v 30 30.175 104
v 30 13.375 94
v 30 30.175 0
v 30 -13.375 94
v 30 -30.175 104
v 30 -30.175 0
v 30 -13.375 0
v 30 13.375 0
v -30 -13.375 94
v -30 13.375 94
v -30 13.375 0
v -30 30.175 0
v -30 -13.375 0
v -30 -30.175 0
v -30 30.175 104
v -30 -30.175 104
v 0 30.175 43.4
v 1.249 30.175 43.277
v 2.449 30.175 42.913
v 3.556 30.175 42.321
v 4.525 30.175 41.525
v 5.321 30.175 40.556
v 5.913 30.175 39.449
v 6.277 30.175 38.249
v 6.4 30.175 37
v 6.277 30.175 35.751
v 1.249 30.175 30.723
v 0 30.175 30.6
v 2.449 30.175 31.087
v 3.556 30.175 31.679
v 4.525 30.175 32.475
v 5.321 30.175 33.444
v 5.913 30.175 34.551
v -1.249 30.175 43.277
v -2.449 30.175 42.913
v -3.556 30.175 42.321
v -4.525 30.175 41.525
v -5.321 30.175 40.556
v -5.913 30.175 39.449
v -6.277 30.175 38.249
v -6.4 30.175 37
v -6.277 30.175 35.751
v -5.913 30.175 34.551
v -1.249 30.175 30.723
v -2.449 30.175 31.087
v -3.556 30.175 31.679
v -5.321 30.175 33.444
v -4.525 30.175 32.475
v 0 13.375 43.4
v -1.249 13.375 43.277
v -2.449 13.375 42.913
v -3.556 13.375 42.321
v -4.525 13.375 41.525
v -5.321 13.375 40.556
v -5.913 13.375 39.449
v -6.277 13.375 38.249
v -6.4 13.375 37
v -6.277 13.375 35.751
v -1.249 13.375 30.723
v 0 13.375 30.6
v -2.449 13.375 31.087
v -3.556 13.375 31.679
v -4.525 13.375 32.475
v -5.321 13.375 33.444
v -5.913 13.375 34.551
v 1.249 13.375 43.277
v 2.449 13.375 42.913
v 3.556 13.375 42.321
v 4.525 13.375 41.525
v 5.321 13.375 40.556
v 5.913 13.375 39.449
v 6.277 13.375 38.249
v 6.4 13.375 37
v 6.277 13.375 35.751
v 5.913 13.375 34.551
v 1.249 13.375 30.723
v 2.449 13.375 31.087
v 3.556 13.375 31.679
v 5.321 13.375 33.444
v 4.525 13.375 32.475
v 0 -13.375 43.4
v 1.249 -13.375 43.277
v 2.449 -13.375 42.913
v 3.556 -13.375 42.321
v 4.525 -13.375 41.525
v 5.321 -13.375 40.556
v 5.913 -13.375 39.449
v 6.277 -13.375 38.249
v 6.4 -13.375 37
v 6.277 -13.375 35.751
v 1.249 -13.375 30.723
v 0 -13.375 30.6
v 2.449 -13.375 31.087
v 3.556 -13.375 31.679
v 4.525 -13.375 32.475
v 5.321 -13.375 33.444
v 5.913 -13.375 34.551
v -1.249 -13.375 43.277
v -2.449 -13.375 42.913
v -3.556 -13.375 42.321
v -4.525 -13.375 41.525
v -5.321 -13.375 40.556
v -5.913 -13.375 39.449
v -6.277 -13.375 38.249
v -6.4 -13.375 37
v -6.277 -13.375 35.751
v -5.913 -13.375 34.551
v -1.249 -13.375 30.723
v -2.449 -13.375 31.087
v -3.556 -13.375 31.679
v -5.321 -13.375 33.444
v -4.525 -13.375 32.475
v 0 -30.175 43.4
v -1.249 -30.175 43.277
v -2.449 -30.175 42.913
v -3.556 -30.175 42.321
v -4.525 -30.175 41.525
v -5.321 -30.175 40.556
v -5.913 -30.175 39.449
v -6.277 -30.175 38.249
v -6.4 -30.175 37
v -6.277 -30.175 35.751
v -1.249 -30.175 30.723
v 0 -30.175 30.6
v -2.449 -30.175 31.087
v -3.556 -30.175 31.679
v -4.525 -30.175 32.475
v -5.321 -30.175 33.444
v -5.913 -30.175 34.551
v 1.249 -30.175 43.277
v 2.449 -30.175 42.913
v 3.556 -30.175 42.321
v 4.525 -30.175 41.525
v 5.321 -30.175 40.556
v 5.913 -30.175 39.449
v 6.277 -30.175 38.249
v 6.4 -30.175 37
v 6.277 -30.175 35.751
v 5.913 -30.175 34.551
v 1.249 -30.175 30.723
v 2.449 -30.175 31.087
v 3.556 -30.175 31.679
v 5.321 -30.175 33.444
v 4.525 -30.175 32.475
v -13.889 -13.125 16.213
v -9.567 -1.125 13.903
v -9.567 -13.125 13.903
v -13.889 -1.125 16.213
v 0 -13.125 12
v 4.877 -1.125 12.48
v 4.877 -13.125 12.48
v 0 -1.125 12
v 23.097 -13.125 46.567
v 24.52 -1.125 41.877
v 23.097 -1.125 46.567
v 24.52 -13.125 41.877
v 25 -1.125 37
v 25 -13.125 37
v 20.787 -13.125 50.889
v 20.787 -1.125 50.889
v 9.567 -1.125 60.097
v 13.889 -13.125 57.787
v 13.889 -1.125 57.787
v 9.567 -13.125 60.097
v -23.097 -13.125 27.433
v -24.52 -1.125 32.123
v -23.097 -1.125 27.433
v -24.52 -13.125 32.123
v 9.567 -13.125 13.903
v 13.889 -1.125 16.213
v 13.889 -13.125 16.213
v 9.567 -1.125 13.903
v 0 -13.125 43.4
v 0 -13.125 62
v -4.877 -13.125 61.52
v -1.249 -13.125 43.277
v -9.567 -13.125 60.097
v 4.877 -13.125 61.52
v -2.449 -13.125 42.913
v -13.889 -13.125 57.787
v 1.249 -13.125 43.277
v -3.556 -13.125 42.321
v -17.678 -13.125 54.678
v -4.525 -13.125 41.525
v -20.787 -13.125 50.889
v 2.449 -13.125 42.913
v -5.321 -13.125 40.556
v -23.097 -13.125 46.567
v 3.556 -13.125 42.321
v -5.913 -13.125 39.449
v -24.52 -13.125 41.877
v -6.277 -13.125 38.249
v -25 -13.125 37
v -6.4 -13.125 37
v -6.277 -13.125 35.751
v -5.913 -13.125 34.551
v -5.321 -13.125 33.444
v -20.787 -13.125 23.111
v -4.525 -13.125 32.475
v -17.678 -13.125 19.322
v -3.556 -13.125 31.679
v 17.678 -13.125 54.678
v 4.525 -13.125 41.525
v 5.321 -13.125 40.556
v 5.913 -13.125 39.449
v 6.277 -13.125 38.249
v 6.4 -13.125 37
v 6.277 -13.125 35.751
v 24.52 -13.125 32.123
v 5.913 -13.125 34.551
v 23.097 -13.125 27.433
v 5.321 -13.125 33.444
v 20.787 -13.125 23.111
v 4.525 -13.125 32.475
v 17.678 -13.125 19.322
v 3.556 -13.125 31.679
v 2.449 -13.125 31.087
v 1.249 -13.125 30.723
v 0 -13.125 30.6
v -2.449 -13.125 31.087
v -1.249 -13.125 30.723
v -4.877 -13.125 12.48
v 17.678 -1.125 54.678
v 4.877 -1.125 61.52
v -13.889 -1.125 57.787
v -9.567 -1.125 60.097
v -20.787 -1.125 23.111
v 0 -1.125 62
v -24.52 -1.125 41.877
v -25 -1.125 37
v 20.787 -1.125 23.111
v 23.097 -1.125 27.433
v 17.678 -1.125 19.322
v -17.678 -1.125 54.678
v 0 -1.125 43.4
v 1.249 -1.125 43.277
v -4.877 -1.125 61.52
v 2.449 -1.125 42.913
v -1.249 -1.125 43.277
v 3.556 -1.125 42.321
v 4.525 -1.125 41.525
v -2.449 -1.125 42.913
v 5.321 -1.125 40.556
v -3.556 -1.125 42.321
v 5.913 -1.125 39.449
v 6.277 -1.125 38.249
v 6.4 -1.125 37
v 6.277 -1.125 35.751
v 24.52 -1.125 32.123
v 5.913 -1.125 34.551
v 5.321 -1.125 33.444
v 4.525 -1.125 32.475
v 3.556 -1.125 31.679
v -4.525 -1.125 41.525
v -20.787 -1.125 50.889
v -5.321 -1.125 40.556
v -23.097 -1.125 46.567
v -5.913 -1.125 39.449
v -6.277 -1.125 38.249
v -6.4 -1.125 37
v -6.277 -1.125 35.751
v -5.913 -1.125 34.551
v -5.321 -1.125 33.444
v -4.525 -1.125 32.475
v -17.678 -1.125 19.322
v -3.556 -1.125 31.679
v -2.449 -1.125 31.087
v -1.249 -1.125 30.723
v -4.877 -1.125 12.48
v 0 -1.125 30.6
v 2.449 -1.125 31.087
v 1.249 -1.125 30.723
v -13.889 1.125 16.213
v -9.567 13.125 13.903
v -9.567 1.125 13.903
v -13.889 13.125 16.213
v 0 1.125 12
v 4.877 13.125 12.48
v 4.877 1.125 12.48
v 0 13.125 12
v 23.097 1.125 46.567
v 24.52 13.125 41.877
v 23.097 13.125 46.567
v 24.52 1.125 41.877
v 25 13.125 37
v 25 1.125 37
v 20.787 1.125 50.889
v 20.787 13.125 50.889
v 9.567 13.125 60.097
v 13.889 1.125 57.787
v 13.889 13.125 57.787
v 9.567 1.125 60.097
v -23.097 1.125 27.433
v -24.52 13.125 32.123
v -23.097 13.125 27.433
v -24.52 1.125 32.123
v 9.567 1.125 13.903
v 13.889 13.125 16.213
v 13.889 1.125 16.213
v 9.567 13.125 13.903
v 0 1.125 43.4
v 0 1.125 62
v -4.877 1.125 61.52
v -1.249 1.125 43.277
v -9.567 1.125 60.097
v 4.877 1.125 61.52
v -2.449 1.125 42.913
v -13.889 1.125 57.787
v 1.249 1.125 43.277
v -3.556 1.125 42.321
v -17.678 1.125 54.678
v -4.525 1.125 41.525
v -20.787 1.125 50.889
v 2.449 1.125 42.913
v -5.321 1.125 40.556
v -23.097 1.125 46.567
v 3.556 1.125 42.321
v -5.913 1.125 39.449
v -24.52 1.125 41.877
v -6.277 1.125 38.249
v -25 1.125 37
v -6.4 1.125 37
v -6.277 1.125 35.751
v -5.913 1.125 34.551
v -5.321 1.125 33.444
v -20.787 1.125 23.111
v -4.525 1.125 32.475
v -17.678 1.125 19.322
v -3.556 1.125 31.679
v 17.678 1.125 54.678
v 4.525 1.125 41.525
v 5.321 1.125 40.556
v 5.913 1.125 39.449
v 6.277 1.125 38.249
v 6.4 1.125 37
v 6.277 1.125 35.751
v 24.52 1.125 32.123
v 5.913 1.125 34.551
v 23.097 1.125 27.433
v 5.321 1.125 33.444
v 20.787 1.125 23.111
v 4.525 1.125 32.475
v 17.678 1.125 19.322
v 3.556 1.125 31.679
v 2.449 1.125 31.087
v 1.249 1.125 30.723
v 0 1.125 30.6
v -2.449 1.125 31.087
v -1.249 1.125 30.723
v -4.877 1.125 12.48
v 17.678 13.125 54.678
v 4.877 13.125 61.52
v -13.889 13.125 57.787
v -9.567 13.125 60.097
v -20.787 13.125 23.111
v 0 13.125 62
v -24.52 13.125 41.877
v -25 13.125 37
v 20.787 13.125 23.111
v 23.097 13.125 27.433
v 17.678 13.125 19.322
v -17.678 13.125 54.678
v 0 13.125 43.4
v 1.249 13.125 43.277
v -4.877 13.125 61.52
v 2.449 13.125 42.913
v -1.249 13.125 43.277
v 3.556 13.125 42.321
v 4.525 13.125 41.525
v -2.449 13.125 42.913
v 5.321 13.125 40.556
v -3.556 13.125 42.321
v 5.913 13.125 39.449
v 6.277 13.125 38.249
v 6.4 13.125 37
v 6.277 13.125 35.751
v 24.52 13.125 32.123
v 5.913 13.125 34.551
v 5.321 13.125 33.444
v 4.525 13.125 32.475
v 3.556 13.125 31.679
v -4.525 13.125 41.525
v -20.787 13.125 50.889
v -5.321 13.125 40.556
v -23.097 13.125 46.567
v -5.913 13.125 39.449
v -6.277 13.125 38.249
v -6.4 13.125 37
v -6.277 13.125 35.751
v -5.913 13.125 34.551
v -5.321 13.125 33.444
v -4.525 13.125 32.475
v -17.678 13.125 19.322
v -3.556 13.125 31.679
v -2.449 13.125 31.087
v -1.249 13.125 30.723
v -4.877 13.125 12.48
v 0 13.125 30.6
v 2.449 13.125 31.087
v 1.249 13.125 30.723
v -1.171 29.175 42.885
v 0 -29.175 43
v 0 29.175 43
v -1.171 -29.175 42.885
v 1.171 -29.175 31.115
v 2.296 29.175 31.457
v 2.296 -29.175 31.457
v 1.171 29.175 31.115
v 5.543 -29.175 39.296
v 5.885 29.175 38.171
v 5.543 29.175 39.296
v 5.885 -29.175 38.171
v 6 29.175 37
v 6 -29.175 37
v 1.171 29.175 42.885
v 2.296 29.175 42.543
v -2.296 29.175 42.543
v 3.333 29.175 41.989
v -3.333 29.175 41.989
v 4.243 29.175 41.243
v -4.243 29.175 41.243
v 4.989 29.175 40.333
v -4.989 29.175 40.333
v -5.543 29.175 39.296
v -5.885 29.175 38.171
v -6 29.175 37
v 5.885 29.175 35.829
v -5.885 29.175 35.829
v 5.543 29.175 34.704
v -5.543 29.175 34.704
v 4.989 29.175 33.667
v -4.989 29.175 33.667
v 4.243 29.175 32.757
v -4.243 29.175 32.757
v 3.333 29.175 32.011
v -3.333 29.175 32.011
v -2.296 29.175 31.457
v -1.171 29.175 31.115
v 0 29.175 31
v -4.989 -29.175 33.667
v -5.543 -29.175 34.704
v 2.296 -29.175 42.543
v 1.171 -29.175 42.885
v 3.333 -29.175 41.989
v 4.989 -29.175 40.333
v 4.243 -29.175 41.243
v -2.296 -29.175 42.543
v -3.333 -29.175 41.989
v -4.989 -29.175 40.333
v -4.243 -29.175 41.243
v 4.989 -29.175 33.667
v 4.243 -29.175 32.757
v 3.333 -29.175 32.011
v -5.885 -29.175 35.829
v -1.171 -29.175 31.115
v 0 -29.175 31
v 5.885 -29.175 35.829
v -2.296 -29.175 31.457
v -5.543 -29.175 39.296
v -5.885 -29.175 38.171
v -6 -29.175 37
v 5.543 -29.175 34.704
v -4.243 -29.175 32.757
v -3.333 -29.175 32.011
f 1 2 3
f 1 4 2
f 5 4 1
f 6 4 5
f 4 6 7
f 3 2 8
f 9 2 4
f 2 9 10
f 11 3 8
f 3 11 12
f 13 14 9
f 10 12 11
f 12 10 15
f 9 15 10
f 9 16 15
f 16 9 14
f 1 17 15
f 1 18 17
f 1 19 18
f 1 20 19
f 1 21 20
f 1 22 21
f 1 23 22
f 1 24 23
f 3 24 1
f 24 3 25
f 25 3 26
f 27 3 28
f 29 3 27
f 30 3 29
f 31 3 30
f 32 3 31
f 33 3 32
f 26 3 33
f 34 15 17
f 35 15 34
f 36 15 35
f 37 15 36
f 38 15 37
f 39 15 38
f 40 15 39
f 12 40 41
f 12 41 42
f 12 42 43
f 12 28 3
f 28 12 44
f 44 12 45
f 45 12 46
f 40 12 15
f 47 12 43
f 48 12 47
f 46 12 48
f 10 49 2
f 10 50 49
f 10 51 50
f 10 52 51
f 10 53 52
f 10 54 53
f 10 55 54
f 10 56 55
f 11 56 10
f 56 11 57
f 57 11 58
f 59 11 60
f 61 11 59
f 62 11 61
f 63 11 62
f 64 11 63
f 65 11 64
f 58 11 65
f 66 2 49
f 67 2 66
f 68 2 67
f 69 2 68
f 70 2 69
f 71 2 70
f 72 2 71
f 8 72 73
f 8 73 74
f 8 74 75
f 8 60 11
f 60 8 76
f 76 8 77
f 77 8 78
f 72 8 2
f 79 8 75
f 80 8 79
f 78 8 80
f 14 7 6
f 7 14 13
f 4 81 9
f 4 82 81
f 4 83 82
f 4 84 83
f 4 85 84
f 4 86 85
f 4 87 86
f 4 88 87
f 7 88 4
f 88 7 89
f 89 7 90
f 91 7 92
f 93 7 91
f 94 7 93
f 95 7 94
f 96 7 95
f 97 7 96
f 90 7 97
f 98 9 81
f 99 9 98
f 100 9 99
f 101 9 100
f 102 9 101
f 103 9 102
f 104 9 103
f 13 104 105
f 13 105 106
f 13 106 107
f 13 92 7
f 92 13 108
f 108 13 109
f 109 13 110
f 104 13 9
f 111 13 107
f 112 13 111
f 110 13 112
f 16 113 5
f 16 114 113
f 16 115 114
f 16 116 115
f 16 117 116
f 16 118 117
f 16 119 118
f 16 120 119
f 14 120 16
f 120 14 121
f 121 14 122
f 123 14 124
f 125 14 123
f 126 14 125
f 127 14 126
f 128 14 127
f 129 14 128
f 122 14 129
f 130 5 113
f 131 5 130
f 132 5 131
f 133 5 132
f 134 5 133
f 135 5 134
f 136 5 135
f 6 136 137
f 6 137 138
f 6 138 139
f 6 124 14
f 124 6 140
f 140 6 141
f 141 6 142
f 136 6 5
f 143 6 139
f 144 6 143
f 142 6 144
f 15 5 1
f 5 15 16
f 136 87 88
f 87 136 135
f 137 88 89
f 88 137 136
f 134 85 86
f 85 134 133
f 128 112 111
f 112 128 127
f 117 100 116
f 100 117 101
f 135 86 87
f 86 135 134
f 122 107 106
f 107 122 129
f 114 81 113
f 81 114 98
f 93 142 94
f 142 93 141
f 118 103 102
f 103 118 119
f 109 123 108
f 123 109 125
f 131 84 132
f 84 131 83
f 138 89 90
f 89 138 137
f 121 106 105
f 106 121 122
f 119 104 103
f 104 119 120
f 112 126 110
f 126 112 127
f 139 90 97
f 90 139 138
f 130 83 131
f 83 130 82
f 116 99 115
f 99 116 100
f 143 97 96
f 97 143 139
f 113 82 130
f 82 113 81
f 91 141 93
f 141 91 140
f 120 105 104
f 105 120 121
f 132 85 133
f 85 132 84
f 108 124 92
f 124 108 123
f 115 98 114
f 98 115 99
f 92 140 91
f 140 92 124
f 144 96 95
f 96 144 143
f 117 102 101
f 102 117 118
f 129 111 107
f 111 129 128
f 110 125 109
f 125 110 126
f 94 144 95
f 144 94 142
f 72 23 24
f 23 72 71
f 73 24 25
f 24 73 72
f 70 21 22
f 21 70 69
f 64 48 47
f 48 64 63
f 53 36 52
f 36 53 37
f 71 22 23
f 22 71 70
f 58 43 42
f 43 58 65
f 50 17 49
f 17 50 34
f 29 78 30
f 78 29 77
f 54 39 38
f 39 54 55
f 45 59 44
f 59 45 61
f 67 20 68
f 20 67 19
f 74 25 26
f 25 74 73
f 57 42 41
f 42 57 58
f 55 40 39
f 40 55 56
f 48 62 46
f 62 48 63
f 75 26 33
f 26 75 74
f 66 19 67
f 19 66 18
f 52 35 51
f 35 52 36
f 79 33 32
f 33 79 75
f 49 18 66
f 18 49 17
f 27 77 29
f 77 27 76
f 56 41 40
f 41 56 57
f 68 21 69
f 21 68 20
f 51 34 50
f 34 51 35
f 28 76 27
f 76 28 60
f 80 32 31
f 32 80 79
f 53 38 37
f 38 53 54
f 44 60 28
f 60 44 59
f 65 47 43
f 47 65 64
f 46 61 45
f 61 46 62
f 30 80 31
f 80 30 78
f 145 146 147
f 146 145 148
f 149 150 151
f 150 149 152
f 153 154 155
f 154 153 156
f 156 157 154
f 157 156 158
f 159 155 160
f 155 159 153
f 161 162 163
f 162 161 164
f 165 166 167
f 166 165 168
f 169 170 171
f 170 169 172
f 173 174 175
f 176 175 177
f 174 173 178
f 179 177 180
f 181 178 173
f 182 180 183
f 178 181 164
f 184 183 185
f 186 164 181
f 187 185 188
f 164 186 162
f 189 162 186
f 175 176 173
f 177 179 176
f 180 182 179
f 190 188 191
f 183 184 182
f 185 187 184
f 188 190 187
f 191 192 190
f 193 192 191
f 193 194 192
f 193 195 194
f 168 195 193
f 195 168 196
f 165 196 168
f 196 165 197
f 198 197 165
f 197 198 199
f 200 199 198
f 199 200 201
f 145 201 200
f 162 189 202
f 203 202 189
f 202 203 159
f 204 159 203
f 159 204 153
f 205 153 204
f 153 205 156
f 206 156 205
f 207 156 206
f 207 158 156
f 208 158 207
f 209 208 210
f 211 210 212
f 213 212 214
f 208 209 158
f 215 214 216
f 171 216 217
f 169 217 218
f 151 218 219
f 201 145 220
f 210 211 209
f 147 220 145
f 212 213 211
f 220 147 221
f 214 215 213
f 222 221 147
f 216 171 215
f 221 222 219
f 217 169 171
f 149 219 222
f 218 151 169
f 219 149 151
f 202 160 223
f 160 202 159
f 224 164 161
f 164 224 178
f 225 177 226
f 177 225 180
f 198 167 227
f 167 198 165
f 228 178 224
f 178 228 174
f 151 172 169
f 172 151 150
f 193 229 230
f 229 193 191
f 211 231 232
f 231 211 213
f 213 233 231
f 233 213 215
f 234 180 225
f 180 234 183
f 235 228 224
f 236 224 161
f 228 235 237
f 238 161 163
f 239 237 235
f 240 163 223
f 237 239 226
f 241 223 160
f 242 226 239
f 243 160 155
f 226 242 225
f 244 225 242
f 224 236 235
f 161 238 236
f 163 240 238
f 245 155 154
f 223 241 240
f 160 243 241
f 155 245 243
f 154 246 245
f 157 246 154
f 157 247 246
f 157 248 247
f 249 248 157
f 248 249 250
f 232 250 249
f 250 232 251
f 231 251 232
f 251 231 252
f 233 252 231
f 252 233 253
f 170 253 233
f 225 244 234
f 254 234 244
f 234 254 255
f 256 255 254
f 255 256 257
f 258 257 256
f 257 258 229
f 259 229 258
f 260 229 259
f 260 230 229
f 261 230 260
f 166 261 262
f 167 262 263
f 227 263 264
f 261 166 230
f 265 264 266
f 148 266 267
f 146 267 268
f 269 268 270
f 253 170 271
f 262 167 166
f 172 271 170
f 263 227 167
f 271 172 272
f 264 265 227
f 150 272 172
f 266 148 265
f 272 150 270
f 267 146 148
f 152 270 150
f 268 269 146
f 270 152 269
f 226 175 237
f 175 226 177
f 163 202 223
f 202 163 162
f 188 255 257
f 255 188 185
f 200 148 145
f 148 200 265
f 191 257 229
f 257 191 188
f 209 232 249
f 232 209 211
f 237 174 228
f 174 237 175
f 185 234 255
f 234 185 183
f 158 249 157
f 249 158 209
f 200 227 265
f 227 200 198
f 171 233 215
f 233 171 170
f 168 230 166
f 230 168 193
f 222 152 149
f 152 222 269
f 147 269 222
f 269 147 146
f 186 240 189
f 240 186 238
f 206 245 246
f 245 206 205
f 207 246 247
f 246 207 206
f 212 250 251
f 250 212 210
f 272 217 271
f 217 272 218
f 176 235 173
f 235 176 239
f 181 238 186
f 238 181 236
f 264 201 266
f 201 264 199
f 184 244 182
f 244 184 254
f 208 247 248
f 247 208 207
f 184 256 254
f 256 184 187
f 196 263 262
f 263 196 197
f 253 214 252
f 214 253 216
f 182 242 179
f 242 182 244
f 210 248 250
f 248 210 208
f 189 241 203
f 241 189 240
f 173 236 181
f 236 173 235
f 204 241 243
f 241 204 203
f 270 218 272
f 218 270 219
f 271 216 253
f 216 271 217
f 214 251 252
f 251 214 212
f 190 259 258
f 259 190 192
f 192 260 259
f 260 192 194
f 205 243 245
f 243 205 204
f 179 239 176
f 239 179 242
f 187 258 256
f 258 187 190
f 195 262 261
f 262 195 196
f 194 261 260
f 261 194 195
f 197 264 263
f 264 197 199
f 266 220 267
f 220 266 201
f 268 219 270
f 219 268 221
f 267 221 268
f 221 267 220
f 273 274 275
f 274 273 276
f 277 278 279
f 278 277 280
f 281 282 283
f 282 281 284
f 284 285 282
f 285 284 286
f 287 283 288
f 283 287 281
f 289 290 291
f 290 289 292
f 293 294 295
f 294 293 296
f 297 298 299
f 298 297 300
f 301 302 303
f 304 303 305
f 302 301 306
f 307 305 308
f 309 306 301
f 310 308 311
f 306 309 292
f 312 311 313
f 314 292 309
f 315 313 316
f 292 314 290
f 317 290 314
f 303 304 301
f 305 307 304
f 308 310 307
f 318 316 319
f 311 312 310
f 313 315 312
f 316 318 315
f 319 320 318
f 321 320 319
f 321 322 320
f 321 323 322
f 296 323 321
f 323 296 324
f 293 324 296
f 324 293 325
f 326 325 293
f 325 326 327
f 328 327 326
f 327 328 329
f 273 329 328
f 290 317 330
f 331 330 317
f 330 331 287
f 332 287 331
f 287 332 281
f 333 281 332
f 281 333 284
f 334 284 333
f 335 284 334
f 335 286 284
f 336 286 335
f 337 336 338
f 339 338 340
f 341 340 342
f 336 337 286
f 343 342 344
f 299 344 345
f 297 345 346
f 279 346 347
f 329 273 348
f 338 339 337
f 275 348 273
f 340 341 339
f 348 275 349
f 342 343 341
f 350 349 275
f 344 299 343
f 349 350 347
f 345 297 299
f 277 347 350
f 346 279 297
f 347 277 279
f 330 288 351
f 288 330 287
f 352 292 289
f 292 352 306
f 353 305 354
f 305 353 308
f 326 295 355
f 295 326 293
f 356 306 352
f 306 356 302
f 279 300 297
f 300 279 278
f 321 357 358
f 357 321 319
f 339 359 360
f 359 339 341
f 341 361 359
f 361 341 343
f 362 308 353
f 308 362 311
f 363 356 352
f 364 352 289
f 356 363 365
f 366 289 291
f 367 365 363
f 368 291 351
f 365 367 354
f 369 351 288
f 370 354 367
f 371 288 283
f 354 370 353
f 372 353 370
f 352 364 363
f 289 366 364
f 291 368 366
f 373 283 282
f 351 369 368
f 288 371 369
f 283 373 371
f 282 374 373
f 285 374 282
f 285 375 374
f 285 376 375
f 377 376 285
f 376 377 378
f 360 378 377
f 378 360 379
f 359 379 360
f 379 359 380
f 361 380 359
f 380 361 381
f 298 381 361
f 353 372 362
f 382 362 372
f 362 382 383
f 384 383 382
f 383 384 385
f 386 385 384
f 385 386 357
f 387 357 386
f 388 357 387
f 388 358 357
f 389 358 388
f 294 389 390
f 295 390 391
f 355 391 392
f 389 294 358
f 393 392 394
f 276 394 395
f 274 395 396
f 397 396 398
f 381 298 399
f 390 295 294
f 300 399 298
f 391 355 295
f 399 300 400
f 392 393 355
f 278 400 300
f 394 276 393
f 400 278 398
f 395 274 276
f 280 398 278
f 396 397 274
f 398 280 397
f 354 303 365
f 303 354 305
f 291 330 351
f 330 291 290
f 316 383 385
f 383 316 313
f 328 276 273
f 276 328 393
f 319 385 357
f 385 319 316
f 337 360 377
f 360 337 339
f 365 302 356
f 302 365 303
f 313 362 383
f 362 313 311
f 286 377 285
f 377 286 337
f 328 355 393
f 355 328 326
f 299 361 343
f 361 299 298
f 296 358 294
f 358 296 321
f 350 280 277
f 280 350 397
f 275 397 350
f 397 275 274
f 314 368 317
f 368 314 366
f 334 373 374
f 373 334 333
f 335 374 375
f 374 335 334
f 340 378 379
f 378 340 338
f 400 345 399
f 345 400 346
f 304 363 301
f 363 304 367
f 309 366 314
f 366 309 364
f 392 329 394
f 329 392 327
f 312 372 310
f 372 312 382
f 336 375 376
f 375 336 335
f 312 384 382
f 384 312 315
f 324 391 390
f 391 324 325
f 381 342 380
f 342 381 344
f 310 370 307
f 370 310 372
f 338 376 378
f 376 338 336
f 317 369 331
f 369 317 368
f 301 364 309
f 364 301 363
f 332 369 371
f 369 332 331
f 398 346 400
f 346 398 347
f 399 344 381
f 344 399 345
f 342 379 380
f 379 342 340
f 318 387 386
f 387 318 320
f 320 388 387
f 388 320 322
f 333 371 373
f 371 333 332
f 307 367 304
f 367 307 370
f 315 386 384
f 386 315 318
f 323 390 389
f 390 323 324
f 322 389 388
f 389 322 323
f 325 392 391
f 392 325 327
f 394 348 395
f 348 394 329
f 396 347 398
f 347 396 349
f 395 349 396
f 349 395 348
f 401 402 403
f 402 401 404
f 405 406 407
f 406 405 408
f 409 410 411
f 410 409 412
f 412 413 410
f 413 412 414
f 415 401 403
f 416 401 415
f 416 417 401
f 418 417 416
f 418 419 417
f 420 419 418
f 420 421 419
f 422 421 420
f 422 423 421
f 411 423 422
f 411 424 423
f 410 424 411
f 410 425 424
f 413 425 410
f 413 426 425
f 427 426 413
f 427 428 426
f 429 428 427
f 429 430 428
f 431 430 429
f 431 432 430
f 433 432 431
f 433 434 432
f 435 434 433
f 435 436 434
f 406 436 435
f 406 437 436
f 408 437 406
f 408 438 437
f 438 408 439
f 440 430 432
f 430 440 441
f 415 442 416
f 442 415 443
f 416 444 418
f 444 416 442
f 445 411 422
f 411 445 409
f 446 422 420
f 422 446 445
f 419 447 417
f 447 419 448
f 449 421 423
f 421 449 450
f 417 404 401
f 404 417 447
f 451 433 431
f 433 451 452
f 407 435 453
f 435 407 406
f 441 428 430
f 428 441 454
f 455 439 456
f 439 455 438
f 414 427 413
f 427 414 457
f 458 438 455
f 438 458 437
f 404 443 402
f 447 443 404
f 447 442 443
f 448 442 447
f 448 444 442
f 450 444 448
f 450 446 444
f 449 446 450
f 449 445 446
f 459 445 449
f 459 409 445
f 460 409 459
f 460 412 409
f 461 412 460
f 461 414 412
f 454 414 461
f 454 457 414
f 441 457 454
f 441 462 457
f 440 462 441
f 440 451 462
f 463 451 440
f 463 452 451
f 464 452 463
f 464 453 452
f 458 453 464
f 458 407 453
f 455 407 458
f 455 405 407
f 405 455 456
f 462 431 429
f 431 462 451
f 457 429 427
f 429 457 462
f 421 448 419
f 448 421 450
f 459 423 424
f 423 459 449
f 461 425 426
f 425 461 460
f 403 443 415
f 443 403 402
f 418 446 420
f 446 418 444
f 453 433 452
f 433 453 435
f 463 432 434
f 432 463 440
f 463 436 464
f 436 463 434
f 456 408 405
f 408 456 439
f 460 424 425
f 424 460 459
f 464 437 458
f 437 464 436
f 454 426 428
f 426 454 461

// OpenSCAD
$fn = 32;

// ------------------------------------------------------------------------
// Trolley wheel set: wheels d50, fork 94 mm tall
// Every part is its own module, assembly() places every instance.
// ------------------------------------------------------------------------

// --- part 1 ---
module trolley_fork() {
  difference() {
    union() {
      translate([-30, 13.375, 0]) cube([60, 16.8, 94]);
      translate([-30, -30.175, 0]) cube([60, 16.8, 94]);
      translate([-30, -30.175, 94]) cube([60, 60.35, 10]);
    }
    translate([0, -21.775, 37]) rotate([90, 0, 0]) cylinder(h = 18.8, d = 12.8, center = true);
    translate([0, 21.775, 37]) rotate([90, 0, 0]) cylinder(h = 18.8, d = 12.8, center = true);
  }
}

// --- part 2 ---
module trolley_wheel() {
  difference() {
      translate([0, 0, 0]) cylinder(h = 12, d = 50);
      translate([0, 0, -1]) cylinder(h = 14, d = 12.8);
    }
}

// --- part 3 ---
module trolley_axle() {
  translate([0, 0, -29.175]) cylinder(h = 58.35, d = 12);
}

// --- assembly ---
module assembly() {
  color([0.80, 0.24, 0.20]) translate([0, 0, 0]) rotate([0, 0, 0]) trolley_fork();
  color([0.20, 0.45, 0.75]) translate([0, -1.125, 37]) rotate([90, 0, 0]) trolley_wheel();
  color([0.25, 0.62, 0.32]) translate([0, 13.125, 37]) rotate([90, 0, 0]) trolley_wheel();
  color([0.92, 0.70, 0.18]) translate([0, 0, 37]) rotate([90, 0, 0]) trolley_axle();
}

assembly();
